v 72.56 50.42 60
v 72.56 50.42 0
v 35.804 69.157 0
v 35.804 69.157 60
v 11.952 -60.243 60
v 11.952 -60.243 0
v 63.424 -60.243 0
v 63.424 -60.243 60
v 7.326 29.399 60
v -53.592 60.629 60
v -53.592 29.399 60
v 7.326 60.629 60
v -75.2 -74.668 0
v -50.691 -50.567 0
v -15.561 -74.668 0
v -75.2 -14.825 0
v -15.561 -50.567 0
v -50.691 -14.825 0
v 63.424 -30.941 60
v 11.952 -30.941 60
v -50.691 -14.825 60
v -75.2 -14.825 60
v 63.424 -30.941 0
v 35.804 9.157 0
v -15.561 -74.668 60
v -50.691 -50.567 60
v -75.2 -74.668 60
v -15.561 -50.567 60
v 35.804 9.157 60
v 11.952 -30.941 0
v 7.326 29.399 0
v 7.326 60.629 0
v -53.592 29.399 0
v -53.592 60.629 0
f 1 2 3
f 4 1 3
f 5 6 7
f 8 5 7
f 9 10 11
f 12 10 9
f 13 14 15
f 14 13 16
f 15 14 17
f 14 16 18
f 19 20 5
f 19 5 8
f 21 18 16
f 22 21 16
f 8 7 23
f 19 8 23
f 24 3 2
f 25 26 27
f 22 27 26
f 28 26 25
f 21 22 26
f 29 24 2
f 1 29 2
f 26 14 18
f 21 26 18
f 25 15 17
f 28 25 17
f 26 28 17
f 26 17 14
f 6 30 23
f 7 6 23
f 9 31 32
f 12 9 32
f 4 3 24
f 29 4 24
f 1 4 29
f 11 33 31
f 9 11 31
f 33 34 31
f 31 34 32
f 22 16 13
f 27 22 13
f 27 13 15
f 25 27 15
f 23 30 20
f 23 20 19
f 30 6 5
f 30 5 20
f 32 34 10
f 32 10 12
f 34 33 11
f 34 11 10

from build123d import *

# Parameters (mm, degrees)
F3_DEPTH = 60
F4_DEPTH = 60
F0_W     = 60.917996
F0_H     = 31.230113
F5_DEPTH = 60
F6_W     = 51.471852
F6_H     = 29.302327
F7_DEPTH = 60


with BuildPart() as f3:
    # F1 (on face) → F3 (new body)
    with BuildSketch(Plane.XY):
        Polygon((72.560265, 50.42011), (35.803657, 69.157153), (35.803657, 9.157153), align=None)
    extrude(amount=F3_DEPTH)


with BuildPart() as f4:
    # F2 (on Top) → F4 (new body)
    with BuildSketch(Plane.XY):
        Polygon((-75.199924, -14.825164), (-75.199924, -74.667974), (-15.561358, -74.667974), (-15.561358, -50.567455), (-50.690927, -50.567455), (-50.690927, -14.825164), align=None)
    extrude(amount=F4_DEPTH)


with BuildPart() as f5:
    # F0 (on Top) → F5 (new body)
    with BuildSketch(Plane.XY):
        with Locations((-23.133416, 45.013771)):
            Rectangle(F0_W, F0_H)
    extrude(amount=F5_DEPTH)


with BuildPart() as f7:
    # F6 (on Top) → F7 (new body)
    with BuildSketch(Plane.XY):
        with Locations((37.688192, -45.592107)):
            Rectangle(F6_W, F6_H)
    extrude(amount=F7_DEPTH)


solid = Compound([f3.part, f4.part, f5.part, f7.part])
